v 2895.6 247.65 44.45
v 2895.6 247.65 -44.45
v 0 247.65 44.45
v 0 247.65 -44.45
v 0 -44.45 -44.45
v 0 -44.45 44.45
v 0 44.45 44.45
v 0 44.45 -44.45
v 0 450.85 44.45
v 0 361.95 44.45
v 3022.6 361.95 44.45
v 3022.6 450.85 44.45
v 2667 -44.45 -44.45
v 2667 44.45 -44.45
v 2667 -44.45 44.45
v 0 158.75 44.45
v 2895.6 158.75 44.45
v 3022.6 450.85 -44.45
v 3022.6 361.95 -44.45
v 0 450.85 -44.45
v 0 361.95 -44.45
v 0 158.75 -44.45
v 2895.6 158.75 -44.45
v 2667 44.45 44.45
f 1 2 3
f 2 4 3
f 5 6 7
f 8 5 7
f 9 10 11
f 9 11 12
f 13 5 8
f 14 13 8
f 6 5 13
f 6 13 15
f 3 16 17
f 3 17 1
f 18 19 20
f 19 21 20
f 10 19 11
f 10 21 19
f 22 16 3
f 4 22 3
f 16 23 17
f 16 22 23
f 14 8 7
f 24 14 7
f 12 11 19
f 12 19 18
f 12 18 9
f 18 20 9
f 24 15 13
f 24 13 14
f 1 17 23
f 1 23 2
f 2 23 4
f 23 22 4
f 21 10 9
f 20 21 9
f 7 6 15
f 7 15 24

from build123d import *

# Parameters (mm, degrees)
F0_W     = 88.9
F0_H     = 88.9
F1_DEPTH = 2667
F3_DEPTH = 228.6
F5_DEPTH = 355.6


with BuildPart() as f1:
    # F0 (on Right) → F1 (new body)
    with BuildSketch(Plane.YZ):
        Rectangle(F0_W, F0_H)
    extrude(amount=F1_DEPTH)


with BuildPart() as f2_1:
    # F2: copy of F1
    add(f1.part.moved(Location((0, 203.2, 0))))

    # F3 (add): a face of the model
    f3_faces = [f2_1.faces().sort_by_distance(p)[0] for p in [
        (2667, 203.2, 0),
    ]]
    extrude(f3_faces, amount=F3_DEPTH)


with BuildPart() as f4_1:
    # F4: copy of F1
    add(f1.part.moved(Location((0, 406.4, 0))))

    # F5 (add): a face of the model
    f5_faces = [f4_1.faces().sort_by_distance(p)[0] for p in [
        (2667, 406.4, 0),
    ]]
    extrude(f5_faces, amount=F5_DEPTH)


solid = Compound([f1.part, f2_1.part, f4_1.part])
